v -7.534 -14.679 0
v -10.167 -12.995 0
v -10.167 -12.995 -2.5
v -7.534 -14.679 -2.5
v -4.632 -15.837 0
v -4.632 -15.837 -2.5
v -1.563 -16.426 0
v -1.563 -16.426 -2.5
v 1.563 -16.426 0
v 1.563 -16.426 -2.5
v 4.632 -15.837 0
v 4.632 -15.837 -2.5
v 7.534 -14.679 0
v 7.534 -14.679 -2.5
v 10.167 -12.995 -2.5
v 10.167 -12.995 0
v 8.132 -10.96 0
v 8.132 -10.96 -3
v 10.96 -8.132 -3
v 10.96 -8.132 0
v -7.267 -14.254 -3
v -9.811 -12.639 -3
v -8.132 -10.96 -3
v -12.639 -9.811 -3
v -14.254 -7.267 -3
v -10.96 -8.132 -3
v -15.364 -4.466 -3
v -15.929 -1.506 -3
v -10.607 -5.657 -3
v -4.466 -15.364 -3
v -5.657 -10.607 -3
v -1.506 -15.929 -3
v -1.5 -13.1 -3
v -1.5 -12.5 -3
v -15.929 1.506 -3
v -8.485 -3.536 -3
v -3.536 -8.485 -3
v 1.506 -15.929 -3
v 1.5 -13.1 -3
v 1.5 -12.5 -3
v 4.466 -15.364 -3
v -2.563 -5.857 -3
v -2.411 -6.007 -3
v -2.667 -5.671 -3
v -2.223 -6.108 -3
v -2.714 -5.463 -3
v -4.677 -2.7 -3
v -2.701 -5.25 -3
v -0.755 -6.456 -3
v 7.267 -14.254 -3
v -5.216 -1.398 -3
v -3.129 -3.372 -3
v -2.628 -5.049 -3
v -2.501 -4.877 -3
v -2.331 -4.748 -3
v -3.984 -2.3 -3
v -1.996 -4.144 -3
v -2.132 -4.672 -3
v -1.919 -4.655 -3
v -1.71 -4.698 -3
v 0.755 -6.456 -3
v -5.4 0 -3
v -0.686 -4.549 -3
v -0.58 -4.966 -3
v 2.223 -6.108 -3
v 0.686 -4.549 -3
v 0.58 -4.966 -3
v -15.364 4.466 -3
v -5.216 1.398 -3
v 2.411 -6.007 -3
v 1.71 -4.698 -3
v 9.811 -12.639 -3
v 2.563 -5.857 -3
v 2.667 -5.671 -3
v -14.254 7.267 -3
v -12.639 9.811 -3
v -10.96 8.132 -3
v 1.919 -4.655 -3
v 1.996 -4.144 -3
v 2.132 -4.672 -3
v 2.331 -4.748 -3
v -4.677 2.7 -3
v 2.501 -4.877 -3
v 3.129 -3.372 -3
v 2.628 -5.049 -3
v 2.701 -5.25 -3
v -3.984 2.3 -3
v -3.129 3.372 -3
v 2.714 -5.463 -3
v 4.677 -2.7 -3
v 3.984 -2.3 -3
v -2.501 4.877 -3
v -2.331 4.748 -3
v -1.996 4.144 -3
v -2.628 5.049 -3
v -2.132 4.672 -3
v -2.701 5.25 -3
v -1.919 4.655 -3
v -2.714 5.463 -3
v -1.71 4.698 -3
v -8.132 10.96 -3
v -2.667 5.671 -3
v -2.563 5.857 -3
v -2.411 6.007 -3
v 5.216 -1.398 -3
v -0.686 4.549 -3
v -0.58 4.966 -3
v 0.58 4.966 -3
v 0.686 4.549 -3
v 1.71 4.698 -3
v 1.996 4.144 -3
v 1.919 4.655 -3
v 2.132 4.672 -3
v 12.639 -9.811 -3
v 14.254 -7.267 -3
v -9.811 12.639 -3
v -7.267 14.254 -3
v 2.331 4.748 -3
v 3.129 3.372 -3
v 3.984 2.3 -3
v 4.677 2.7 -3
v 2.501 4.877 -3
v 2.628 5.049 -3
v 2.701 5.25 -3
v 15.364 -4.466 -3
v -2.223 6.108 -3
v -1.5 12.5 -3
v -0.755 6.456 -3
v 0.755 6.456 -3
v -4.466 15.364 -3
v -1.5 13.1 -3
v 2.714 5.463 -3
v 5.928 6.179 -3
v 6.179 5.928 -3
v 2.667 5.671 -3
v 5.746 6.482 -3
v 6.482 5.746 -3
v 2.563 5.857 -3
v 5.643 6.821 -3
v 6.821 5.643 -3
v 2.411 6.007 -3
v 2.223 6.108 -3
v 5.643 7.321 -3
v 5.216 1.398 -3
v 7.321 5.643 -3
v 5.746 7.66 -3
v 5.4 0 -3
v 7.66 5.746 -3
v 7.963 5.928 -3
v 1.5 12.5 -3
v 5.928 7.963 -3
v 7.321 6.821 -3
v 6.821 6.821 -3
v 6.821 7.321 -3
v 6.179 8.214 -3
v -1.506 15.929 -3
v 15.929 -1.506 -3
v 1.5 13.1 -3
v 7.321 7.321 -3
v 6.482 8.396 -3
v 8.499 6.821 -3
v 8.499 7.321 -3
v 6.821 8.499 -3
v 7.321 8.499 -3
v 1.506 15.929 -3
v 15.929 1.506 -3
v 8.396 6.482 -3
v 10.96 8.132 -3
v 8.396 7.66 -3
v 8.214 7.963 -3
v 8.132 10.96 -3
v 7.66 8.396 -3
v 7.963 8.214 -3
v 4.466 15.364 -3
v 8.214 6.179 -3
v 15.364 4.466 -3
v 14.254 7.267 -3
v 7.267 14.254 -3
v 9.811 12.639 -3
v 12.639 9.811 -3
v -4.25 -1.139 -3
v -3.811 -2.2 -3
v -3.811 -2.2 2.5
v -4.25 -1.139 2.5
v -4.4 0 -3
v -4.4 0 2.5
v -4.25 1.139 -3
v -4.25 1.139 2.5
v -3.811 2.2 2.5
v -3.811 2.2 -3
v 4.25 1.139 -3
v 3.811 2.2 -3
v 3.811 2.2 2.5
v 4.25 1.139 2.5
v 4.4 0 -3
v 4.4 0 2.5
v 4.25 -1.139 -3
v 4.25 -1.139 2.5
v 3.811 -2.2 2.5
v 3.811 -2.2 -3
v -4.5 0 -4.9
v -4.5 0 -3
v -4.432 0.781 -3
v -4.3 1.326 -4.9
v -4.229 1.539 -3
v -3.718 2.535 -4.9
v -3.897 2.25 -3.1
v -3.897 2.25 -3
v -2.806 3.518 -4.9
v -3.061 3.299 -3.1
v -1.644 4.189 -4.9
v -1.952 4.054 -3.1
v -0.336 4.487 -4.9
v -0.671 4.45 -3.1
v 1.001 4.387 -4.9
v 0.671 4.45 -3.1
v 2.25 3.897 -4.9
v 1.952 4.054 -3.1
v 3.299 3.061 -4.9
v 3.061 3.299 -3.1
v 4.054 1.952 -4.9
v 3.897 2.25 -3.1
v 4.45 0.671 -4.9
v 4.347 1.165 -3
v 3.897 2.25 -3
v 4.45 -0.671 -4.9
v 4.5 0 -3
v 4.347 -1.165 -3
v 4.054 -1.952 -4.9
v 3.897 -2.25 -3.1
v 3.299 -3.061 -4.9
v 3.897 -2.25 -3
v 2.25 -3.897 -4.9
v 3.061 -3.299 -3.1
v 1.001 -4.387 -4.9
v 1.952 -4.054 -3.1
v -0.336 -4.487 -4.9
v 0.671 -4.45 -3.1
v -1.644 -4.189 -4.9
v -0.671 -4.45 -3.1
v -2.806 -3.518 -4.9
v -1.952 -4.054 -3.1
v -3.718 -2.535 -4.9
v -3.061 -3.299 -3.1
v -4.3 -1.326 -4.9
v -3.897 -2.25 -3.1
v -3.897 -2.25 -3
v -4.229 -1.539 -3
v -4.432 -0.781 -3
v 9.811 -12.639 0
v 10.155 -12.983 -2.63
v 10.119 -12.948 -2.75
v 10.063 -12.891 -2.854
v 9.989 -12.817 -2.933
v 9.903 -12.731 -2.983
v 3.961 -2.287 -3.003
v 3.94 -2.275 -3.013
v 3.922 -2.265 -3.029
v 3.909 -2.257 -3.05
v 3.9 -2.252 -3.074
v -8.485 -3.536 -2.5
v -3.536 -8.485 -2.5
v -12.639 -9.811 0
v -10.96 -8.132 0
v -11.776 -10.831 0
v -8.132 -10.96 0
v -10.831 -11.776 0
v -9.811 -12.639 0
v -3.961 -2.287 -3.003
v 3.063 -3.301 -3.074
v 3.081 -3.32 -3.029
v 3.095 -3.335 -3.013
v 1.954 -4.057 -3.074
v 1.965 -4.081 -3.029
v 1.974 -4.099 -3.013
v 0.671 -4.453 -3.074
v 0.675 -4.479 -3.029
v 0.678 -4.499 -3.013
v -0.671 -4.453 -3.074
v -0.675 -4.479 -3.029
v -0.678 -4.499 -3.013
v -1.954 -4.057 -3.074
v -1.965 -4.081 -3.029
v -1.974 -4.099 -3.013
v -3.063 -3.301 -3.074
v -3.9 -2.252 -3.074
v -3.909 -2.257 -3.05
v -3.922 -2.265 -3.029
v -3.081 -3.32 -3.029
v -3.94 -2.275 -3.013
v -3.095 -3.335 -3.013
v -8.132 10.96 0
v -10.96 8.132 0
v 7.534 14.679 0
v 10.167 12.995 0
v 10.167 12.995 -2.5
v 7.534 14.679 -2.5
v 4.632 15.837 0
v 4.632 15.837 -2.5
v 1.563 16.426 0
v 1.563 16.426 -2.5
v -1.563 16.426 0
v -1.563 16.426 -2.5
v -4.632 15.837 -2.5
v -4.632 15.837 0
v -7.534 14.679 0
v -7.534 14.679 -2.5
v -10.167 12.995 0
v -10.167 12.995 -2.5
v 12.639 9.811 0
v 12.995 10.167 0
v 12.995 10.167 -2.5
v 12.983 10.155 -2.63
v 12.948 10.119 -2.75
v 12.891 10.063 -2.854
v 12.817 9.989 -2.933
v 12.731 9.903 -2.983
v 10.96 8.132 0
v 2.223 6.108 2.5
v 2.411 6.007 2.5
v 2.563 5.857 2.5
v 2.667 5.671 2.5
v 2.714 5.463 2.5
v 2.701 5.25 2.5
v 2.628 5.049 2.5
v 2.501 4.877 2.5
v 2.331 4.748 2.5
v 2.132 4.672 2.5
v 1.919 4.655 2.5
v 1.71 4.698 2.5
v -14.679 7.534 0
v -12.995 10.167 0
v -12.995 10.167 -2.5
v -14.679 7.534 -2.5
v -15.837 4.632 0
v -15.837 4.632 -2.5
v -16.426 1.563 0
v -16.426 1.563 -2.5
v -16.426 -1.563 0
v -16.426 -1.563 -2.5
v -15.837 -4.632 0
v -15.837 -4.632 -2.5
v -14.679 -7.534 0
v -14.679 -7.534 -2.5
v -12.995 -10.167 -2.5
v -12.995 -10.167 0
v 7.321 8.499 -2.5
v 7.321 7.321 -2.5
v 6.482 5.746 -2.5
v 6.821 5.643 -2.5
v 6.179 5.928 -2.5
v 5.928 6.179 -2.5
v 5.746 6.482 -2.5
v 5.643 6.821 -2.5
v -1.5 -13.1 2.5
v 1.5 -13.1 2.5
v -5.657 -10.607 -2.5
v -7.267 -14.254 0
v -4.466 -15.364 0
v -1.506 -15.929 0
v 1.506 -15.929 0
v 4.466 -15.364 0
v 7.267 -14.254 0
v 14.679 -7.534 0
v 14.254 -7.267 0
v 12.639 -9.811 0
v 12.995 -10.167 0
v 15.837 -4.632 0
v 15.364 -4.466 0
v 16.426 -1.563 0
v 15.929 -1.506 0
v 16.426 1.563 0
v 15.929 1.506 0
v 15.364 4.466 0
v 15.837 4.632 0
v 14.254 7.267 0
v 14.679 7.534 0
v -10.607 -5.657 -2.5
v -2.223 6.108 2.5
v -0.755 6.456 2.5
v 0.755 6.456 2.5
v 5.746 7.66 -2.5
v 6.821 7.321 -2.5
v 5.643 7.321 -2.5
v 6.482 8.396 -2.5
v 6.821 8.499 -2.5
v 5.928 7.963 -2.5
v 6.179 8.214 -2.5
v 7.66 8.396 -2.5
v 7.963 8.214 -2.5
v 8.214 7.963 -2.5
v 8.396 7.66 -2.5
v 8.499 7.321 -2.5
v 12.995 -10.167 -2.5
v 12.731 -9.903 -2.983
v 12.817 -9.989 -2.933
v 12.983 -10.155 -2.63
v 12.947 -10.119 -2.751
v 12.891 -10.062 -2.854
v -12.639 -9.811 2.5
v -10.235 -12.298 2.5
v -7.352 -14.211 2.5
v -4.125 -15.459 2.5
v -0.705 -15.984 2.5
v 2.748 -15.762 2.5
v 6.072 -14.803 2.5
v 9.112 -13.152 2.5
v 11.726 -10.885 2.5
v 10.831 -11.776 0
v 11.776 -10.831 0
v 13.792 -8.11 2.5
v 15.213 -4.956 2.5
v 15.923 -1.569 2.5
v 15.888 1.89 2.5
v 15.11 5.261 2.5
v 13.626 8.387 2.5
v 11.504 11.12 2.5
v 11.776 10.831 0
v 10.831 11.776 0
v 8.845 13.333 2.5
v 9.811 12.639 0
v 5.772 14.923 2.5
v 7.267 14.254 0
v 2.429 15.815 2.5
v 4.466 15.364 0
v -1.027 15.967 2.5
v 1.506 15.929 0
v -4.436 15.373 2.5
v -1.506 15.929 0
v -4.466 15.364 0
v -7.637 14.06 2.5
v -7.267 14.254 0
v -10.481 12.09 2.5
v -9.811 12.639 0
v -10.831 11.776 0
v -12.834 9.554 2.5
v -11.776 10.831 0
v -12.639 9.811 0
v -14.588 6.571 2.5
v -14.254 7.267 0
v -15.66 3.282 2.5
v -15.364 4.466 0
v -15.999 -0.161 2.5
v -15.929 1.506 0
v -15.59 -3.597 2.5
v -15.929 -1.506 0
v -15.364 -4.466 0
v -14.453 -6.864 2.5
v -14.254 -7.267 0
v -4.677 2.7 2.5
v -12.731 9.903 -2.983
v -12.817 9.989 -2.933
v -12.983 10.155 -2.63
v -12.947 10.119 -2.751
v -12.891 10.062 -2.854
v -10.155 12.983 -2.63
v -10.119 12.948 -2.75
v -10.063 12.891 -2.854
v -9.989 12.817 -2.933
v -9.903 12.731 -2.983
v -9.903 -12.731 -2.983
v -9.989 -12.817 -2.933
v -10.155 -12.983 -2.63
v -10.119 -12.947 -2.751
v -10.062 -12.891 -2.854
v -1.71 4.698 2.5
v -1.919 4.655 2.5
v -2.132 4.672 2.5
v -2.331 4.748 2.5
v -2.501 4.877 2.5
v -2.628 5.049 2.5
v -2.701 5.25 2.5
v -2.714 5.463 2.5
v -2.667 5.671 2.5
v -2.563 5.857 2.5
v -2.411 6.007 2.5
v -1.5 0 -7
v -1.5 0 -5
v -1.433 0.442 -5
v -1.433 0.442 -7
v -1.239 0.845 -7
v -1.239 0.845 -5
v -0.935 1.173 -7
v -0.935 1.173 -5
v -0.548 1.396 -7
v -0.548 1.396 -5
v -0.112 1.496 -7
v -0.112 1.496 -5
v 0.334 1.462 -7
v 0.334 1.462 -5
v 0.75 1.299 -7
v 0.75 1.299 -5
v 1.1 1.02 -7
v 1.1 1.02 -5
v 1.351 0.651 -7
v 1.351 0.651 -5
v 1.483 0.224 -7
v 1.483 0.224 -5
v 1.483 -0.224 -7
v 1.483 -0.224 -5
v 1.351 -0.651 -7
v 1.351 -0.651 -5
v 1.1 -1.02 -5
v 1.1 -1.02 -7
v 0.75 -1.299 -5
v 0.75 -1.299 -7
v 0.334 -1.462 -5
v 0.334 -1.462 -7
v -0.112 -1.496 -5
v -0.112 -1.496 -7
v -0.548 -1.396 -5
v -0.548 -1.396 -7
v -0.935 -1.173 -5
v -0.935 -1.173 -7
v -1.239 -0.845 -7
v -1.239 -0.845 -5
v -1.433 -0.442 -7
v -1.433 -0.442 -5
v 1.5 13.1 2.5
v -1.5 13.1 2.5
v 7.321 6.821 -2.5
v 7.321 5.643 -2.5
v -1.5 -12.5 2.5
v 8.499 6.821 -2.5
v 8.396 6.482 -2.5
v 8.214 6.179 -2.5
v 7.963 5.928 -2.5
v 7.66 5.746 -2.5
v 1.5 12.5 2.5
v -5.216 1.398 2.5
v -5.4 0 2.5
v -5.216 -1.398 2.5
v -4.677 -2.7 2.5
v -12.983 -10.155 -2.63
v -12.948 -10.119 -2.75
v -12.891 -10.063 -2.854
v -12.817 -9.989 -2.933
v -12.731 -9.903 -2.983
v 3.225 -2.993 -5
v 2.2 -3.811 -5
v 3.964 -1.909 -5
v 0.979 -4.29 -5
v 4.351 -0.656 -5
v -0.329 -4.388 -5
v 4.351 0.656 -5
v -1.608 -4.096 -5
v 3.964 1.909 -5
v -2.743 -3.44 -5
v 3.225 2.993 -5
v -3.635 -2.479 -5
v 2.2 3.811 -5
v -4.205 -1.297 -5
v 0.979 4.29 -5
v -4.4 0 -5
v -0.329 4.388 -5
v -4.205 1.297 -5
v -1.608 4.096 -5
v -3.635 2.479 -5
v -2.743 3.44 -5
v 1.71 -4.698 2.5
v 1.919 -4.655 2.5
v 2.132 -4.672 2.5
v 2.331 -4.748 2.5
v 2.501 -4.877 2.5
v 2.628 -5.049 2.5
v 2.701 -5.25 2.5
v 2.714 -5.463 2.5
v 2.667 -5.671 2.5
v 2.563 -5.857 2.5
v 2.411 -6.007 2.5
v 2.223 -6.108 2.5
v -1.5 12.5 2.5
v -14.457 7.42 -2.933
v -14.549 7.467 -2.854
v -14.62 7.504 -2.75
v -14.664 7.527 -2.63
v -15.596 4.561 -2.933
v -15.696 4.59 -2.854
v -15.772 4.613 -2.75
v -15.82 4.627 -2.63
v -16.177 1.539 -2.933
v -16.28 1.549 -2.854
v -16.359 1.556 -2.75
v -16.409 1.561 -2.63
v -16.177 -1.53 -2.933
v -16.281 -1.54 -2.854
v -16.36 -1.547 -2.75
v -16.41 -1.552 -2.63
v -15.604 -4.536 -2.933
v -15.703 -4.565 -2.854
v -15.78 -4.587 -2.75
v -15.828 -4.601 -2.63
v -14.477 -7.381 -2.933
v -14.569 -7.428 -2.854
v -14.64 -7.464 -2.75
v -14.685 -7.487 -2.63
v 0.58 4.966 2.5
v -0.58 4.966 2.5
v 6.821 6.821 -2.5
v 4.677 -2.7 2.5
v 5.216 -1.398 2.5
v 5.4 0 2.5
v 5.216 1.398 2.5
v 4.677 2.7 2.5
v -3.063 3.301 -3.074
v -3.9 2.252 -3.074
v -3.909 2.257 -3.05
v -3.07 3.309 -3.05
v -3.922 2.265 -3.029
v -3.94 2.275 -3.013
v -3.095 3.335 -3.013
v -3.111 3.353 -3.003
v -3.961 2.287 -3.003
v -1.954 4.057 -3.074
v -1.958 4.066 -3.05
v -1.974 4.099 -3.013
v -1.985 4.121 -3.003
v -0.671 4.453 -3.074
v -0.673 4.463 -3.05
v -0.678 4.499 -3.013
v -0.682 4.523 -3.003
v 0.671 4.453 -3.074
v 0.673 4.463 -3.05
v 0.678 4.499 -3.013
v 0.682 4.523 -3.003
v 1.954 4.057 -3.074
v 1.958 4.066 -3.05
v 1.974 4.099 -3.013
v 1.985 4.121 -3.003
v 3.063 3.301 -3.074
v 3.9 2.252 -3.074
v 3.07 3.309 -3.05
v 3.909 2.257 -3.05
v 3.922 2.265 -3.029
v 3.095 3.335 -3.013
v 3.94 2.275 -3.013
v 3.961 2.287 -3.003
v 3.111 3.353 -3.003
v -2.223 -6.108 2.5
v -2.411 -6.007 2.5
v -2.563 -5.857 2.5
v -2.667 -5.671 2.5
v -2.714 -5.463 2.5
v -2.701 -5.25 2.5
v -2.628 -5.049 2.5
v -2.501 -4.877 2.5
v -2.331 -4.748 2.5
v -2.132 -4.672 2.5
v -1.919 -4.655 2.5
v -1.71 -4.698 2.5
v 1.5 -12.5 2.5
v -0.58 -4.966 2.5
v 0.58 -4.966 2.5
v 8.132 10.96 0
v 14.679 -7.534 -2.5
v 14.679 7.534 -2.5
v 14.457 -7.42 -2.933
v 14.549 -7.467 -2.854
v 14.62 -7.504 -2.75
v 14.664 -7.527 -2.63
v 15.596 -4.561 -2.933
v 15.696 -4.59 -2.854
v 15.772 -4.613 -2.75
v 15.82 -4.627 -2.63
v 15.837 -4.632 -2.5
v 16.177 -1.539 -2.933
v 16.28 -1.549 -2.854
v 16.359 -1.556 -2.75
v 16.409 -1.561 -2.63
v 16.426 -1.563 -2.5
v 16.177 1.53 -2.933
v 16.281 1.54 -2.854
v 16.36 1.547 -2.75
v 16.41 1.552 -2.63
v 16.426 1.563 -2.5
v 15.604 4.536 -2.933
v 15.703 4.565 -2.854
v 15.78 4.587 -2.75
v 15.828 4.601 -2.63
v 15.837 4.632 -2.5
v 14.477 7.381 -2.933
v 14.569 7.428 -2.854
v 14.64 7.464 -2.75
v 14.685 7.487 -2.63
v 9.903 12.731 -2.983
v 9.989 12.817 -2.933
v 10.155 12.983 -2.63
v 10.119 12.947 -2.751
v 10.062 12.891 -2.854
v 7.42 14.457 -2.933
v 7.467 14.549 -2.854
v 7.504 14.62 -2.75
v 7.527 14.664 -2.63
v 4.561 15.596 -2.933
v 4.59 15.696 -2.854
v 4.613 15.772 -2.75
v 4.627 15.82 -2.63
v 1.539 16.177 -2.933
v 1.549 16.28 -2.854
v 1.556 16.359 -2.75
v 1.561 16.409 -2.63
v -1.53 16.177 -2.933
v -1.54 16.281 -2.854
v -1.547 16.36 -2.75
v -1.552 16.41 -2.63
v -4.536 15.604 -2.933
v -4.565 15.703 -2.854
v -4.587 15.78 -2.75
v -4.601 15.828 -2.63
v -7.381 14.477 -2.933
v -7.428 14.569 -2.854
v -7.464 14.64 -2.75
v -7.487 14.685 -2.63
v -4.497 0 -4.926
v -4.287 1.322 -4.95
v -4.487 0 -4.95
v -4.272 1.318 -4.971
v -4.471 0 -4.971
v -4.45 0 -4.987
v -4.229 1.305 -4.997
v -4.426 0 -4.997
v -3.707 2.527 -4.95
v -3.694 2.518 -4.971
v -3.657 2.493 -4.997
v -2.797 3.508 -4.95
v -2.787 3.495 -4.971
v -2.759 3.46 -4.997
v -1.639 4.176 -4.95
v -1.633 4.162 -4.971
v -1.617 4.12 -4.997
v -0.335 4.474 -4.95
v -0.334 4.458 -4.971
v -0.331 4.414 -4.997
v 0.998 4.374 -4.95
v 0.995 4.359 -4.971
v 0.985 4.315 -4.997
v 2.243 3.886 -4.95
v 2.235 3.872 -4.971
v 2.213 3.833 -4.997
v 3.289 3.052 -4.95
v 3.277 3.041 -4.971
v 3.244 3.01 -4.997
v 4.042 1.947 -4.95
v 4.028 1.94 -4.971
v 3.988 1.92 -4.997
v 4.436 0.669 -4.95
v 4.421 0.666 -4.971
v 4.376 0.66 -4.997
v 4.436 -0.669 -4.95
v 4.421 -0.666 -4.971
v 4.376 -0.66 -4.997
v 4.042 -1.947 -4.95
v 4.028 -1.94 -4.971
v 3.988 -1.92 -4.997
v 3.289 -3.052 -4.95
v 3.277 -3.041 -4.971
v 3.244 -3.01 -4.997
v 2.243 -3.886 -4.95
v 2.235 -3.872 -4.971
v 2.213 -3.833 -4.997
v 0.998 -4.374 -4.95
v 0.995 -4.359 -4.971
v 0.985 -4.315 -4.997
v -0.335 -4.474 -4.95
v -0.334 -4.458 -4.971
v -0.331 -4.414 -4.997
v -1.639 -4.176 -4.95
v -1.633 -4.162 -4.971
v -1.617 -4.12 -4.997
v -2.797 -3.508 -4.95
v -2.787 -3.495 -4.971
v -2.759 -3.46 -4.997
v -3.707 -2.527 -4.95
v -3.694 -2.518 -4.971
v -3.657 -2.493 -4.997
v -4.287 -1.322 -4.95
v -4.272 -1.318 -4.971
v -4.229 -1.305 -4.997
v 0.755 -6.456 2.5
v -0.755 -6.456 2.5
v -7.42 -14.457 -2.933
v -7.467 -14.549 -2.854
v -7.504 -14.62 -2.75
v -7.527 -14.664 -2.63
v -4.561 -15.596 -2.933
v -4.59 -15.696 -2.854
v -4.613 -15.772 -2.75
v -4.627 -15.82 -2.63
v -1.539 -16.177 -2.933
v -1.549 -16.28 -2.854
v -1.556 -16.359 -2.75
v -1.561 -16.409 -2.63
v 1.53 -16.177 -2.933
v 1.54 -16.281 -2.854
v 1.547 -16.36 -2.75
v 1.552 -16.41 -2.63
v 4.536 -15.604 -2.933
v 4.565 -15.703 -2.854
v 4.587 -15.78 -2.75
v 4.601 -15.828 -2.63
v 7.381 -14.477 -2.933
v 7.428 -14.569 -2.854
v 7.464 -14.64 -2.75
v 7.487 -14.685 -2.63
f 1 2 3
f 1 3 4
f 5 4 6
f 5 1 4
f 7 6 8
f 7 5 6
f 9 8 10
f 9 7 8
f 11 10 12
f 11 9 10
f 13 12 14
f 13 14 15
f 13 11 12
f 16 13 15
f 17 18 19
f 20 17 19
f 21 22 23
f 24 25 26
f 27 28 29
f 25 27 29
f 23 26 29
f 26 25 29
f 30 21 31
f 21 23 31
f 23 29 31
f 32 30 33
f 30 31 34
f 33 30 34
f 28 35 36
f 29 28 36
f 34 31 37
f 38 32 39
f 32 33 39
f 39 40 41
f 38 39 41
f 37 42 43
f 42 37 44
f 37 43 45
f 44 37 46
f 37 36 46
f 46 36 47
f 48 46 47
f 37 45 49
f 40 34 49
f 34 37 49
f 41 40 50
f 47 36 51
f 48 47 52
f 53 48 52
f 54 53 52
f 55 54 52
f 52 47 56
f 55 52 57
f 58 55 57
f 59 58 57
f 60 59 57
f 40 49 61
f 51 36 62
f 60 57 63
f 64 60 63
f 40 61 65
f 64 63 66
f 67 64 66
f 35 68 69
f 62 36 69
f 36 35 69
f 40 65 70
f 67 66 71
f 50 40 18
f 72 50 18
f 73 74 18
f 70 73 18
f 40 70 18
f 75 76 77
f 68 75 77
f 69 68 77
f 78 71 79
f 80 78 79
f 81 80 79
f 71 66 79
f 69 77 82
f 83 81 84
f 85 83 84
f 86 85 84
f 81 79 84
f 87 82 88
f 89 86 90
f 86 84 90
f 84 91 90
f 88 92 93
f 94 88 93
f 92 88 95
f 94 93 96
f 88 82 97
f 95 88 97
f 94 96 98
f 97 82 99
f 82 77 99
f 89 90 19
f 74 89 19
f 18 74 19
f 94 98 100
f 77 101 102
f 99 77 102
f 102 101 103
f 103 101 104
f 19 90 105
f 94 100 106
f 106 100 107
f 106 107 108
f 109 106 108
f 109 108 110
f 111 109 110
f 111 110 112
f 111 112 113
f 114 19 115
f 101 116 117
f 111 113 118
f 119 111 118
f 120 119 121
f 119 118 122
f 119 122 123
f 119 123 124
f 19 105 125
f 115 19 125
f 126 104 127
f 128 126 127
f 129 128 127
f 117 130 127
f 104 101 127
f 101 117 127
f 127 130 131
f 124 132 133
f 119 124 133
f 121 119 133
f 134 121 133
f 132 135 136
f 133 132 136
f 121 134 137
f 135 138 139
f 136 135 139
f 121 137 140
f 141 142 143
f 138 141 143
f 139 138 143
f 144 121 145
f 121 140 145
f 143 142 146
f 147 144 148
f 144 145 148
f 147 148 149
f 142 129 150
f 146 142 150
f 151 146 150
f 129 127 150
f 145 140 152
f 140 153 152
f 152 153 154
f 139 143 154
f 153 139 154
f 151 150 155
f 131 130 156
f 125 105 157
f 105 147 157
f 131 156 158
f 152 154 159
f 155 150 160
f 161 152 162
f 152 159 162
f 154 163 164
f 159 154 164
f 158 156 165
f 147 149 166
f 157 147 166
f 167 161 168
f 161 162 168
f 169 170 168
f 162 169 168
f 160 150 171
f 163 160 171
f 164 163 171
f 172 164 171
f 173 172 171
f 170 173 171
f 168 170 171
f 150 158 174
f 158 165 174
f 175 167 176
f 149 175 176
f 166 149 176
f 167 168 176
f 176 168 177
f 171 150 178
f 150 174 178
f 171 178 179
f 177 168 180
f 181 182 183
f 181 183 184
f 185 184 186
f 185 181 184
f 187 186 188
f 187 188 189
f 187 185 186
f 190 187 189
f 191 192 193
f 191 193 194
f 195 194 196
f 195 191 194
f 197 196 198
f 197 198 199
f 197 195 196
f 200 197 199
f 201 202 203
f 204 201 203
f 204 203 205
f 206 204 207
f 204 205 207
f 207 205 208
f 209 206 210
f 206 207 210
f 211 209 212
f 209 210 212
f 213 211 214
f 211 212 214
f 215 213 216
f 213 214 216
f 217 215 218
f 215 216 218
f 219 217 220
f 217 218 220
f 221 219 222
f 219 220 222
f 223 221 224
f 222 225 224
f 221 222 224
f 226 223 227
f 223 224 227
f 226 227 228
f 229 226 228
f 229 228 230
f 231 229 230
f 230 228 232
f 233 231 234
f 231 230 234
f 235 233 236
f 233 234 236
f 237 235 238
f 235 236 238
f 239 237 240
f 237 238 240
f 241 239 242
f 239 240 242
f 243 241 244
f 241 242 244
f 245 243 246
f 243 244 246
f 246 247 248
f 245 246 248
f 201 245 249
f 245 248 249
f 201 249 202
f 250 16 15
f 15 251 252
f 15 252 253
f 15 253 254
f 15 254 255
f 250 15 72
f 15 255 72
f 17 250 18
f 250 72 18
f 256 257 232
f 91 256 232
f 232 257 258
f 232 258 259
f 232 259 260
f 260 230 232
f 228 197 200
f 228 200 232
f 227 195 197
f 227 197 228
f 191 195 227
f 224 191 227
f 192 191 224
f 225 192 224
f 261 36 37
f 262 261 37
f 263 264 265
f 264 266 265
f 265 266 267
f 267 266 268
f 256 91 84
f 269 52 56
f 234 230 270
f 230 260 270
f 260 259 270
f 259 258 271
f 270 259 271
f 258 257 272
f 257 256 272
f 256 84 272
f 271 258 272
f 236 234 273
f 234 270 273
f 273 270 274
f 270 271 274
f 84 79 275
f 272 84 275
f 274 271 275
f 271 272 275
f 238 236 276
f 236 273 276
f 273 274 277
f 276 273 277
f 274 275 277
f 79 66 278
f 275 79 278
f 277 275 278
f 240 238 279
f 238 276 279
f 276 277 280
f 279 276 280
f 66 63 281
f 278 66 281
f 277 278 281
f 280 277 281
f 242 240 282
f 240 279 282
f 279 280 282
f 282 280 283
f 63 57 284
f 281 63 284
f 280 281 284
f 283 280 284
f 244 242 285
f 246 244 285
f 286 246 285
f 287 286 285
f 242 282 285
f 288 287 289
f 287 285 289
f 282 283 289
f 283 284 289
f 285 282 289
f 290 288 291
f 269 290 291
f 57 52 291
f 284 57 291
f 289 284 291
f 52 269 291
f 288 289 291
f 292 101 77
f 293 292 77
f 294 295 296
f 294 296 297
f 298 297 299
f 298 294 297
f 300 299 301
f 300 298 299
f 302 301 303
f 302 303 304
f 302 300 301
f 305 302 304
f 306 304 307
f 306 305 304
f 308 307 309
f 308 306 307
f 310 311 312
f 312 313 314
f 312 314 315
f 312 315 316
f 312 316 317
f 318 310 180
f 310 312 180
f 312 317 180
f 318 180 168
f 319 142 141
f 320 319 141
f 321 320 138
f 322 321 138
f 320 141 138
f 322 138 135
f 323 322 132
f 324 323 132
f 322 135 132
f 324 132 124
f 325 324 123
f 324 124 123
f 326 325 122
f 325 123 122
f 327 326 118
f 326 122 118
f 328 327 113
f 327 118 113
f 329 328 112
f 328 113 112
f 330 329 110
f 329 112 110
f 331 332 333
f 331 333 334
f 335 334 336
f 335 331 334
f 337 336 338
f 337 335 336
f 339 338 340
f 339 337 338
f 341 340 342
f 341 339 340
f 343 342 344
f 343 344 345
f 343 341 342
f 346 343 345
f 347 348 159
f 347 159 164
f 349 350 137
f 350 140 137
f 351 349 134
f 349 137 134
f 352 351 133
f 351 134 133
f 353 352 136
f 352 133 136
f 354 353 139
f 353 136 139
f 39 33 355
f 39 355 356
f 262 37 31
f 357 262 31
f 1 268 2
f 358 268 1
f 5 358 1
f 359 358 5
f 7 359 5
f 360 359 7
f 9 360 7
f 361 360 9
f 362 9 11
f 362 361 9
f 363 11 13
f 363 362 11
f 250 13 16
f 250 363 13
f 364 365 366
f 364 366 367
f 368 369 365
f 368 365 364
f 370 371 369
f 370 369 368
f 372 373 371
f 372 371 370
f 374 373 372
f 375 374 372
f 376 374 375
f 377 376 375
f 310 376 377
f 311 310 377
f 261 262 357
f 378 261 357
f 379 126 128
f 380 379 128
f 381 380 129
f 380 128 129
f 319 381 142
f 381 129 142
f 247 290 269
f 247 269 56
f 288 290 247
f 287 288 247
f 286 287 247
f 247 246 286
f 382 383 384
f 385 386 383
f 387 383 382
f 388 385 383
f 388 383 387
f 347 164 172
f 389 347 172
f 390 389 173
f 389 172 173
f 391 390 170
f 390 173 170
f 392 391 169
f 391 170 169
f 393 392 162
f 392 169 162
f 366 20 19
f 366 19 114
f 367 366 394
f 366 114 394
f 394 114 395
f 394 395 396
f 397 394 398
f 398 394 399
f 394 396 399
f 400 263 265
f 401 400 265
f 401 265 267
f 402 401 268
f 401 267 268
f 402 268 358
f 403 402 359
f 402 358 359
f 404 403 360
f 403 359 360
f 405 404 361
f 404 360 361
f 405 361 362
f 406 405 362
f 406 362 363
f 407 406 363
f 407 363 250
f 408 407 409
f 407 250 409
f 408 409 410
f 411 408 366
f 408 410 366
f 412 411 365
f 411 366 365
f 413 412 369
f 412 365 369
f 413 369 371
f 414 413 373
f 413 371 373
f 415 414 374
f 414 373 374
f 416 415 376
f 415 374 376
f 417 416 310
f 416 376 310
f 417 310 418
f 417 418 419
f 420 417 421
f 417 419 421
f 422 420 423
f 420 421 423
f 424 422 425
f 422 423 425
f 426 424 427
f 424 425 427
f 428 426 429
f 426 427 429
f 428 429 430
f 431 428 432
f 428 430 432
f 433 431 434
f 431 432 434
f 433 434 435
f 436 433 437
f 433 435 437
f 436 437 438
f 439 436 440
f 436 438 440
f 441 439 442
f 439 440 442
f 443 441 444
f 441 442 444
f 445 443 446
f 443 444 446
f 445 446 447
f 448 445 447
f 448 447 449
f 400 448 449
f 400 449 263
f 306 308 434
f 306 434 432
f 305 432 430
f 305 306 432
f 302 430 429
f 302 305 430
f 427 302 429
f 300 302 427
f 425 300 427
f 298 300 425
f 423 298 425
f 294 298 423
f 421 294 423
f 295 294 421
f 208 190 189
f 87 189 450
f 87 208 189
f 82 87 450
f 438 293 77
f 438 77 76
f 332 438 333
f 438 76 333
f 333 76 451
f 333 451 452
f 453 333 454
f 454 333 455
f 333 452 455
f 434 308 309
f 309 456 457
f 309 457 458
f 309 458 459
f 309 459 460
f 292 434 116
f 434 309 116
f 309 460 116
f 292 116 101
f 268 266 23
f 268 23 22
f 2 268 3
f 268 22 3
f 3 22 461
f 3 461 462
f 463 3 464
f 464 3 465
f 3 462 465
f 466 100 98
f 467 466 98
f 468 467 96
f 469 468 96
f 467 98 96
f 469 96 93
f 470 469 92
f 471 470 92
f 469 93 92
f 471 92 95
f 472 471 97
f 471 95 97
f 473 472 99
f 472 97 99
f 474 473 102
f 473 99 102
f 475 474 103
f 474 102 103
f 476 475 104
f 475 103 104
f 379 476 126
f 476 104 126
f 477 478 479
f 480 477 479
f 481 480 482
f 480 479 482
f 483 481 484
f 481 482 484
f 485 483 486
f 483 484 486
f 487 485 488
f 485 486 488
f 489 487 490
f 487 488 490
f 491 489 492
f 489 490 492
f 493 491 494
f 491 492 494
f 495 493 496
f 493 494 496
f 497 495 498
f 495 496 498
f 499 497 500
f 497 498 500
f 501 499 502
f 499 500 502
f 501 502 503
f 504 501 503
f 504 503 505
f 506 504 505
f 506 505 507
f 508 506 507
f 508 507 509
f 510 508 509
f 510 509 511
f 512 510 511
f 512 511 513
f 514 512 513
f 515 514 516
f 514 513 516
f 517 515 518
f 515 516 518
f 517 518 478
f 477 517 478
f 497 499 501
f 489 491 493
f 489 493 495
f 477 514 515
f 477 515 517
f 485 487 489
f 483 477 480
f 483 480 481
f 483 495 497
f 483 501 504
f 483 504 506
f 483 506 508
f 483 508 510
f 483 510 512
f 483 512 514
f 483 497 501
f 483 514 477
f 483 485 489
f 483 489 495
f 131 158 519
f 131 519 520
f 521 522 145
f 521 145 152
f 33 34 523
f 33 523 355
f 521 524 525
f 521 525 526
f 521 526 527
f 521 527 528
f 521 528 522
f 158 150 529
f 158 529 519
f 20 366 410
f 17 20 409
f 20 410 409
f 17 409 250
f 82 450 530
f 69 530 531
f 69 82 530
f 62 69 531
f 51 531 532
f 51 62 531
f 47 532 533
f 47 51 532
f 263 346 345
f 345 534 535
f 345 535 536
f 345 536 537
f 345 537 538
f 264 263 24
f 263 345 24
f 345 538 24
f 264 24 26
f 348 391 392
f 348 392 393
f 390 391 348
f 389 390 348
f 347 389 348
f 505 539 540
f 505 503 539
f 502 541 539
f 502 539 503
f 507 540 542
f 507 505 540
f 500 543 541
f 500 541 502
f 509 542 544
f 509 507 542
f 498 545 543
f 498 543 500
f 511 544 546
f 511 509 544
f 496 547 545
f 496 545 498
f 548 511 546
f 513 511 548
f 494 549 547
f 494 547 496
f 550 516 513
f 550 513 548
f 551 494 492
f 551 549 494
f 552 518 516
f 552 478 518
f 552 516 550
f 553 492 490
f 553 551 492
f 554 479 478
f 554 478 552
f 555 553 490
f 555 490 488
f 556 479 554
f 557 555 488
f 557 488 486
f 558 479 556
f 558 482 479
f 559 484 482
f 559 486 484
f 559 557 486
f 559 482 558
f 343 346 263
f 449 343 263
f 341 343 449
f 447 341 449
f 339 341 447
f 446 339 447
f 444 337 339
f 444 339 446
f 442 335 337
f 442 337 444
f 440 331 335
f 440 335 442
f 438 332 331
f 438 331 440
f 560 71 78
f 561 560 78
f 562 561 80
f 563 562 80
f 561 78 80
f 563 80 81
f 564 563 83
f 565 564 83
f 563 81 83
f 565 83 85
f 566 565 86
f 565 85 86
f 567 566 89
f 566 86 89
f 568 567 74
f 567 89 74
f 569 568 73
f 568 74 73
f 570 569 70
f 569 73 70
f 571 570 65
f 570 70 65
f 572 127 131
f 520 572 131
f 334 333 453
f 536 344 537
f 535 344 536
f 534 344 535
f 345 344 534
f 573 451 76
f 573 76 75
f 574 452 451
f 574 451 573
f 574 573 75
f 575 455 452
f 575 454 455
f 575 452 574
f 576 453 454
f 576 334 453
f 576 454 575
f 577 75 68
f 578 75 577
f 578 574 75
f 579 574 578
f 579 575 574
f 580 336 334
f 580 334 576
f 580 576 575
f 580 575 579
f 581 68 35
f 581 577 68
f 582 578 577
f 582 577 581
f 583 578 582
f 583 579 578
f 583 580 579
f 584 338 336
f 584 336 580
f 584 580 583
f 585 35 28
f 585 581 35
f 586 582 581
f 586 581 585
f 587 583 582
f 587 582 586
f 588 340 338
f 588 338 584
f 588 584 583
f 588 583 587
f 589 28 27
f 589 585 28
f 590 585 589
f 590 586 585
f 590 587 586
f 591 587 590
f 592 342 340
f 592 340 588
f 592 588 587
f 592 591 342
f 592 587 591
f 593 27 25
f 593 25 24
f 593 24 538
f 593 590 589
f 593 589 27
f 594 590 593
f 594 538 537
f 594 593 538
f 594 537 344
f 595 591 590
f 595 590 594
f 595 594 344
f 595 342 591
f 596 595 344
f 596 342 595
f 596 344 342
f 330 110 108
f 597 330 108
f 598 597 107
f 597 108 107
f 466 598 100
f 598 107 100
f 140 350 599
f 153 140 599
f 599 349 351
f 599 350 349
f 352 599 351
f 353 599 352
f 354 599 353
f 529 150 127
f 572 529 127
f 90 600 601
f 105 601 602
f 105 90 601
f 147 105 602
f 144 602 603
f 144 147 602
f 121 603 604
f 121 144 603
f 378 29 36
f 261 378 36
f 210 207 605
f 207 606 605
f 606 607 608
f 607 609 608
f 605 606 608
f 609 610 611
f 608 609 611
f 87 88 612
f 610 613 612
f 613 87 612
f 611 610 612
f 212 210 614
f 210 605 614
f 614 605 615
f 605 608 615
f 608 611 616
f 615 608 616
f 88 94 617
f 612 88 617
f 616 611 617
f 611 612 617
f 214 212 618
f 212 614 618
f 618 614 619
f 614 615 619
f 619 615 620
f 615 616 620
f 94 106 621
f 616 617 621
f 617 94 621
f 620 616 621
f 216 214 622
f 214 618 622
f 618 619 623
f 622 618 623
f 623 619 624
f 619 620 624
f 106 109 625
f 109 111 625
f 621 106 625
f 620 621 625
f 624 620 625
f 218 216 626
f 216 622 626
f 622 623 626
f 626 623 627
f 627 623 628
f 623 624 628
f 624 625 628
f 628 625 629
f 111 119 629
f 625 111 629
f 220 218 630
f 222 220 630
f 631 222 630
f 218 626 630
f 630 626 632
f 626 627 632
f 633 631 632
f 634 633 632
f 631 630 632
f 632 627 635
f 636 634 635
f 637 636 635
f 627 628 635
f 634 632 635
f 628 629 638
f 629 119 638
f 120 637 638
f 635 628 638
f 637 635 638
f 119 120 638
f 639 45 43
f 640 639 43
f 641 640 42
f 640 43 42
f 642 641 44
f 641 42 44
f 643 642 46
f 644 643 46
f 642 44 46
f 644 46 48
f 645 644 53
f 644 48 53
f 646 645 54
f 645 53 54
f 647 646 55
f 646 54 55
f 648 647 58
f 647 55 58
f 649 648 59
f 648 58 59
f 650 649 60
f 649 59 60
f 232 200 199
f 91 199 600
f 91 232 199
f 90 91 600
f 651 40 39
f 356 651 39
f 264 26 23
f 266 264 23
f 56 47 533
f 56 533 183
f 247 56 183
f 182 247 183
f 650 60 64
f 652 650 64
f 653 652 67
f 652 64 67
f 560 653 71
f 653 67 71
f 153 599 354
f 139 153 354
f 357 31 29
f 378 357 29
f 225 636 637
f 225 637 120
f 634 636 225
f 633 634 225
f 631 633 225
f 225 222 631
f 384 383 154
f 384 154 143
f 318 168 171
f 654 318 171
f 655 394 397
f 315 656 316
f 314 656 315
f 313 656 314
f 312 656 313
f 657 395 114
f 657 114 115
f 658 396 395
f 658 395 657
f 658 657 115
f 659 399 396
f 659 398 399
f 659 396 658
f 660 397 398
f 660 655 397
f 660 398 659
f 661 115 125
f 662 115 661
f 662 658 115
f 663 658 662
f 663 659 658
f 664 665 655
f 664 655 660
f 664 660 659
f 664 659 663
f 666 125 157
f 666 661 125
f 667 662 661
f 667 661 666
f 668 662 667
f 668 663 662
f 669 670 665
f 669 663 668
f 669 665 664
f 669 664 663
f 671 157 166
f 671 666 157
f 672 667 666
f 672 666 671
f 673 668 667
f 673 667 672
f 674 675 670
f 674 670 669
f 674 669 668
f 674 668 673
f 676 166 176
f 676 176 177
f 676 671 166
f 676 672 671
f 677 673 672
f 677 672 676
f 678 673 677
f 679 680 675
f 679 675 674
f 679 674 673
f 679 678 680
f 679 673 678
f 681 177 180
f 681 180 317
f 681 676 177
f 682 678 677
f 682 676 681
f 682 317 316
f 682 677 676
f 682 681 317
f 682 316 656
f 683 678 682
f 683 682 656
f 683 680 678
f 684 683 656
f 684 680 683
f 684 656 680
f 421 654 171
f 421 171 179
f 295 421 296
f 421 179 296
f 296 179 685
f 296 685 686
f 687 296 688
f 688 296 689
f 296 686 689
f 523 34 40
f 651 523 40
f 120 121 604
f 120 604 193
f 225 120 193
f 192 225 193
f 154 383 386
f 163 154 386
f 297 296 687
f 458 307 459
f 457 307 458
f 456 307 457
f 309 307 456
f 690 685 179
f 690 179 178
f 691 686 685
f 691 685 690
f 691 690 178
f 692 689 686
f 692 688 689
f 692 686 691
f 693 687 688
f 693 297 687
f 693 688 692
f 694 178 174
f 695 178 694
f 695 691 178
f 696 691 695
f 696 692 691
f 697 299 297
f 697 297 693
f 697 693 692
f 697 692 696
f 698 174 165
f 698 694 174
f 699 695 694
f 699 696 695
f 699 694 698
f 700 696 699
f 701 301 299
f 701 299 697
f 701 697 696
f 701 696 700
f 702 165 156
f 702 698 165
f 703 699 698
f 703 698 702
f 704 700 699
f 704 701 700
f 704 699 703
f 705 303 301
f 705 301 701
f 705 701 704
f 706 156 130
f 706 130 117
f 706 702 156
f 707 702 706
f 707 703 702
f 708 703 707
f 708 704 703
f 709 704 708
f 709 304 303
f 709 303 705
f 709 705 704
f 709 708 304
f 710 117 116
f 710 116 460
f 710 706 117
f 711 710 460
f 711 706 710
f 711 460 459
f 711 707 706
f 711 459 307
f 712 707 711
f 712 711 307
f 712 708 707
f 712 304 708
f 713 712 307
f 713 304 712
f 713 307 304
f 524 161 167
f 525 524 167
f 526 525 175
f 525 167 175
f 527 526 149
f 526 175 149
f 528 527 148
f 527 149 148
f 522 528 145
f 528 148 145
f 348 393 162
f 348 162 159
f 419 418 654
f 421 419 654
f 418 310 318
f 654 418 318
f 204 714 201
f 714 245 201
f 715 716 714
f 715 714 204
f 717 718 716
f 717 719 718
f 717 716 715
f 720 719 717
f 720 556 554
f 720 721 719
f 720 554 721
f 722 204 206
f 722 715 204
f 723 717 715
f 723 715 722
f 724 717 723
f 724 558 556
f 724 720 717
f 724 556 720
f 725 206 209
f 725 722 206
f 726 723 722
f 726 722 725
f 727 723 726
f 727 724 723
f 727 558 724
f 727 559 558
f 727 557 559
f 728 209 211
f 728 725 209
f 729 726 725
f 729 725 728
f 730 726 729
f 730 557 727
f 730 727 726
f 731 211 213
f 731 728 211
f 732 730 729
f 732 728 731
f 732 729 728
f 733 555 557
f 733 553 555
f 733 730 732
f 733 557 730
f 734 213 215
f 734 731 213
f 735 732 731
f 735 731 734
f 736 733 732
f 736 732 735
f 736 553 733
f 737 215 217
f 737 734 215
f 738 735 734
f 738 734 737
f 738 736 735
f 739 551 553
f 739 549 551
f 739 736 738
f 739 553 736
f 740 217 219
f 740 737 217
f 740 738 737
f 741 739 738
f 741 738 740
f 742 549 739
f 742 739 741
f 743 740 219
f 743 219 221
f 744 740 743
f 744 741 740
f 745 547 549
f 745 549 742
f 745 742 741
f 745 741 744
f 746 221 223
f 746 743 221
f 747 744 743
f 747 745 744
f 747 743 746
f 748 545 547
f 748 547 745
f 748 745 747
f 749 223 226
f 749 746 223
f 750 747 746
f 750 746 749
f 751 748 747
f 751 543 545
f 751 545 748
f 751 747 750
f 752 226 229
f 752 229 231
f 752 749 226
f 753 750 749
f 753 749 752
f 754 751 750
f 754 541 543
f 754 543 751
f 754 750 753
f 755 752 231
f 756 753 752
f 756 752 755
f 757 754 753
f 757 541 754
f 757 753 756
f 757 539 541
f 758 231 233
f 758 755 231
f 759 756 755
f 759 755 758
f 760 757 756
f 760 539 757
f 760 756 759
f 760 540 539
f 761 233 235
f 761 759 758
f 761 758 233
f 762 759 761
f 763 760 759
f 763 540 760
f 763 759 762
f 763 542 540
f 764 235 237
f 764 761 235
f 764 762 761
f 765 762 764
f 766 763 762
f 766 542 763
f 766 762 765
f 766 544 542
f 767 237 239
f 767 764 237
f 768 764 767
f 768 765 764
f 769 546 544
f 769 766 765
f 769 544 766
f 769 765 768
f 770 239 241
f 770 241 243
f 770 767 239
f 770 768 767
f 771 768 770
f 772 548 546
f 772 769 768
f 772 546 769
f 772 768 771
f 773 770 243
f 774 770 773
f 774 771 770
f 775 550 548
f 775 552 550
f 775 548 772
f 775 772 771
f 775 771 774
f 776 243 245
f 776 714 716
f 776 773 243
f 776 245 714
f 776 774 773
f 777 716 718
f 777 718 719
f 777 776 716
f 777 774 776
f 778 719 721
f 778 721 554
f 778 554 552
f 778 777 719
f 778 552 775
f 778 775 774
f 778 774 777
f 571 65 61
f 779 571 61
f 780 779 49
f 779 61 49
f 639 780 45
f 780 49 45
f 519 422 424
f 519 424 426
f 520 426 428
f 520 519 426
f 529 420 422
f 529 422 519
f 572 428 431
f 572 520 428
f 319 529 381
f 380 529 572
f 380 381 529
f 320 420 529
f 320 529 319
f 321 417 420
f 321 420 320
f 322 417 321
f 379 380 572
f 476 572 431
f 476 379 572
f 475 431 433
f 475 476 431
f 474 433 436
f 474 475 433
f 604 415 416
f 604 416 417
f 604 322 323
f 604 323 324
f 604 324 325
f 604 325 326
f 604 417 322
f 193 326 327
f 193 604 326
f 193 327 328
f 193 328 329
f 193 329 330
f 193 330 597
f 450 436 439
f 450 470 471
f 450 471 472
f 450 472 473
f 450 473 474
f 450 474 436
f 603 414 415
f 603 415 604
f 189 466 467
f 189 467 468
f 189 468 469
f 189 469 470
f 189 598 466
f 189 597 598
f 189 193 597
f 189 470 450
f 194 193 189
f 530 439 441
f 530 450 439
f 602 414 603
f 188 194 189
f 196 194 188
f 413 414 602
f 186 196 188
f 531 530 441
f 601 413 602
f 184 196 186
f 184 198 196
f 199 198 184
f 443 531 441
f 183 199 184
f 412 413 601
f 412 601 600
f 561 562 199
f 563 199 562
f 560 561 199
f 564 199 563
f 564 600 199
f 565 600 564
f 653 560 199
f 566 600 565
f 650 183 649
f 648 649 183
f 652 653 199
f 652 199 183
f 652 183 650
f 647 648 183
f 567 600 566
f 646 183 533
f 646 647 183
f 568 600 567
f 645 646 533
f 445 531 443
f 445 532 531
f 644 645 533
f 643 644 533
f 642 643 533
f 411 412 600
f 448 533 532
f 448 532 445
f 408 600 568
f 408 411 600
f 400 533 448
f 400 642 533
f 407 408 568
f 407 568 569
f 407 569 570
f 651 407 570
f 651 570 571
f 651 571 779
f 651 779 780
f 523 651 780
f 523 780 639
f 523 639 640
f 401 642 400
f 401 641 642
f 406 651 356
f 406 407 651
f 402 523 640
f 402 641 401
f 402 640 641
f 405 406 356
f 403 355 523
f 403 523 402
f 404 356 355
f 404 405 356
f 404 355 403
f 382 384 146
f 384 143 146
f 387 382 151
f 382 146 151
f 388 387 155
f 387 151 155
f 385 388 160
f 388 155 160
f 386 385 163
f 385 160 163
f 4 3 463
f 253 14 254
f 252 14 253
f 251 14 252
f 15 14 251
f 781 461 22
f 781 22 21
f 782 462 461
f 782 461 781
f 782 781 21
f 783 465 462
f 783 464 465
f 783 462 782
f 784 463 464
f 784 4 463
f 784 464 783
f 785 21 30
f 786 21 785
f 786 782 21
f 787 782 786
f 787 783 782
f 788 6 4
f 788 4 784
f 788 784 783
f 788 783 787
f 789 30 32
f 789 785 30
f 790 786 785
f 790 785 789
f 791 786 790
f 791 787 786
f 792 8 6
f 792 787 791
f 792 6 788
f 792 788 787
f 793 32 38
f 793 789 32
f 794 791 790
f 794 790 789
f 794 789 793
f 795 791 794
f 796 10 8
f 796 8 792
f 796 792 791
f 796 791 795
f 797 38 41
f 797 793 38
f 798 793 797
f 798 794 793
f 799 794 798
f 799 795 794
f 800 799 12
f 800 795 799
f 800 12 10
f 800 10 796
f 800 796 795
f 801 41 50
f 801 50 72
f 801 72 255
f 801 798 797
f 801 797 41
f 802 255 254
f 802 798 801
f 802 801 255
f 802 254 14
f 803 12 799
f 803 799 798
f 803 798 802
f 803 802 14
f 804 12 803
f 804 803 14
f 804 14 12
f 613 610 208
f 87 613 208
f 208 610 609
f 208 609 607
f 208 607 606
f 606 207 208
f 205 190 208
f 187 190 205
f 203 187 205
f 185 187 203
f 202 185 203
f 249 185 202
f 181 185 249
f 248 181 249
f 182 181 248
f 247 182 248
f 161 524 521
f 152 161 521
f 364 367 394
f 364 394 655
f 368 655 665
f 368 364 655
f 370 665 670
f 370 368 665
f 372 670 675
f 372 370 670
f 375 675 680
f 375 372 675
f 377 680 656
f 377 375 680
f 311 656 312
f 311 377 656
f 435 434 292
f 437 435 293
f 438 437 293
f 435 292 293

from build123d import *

# Parameters (mm, degrees)
SKETCH1_R           = 16.5
BOSS_EXTRUDE1_DEPTH = 3
SKETCH2_R           = 4.5
BOSS_EXTRUDE2_DEPTH = 2
CUT_EXTRUDE1_DEPTH  = 24.526580712
CIRPATTERN1_COUNT   = 4
SKETCH4_R           = 16
BOSS_EXTRUDE3_DEPTH = 2.5
CUT_EXTRUDE2_DEPTH  = 24.973944189
CIRPATTERN2_COUNT   = 2
CUT_EXTRUDE3_DEPTH  = 24.973944189
CIRPATTERN3_COUNT   = 2
SKETCH8_R           = 1.45
CUT_EXTRUDE4_DEPTH  = 0.5
SKETCH9_W           = 0.5
SKETCH9_H           = 2.9
EXTRUDE_THIN1_DEPTH = 0.5
SKETCH10_W          = 2.9
SKETCH10_H          = 0.5
EXTRUDE_THIN2_DEPTH = 0.5
SKETCH11_W          = 3
SKETCH11_H          = 0.6
CUT_EXTRUDE5_DEPTH  = 24.973944189
CIRPATTERN4_COUNT   = 2
FILLET1_R           = 0.1
FILLET2_R           = 0.5
SKETCH_1_R          = 1.5
EXTRUDE_1_DEPTH     = 2


with BuildPart() as part:
    # Sketch1 → Boss-Extrude1 (new body)
    with BuildSketch(Plane.XY):
        Circle(SKETCH1_R)
    extrude(amount=-BOSS_EXTRUDE1_DEPTH)

    # Sketch2 → Boss-Extrude2 (add)
    with BuildSketch(Plane(origin=(0, 0, -3), x_dir=(-1, 0, 0), z_dir=(0, 0, -1))):
        Circle(SKETCH2_R)
    extrude(amount=BOSS_EXTRUDE2_DEPTH)

    # Sketch3 → Cut-Extrude1 (cut, through all)
    with BuildSketch(Plane(origin=(0, 0, -3), x_dir=(-1, 0, 0), z_dir=(0, 0, -1))):
        Polygon((10.253048327, 13.081475452), (8.131727984, 10.960155108), (10.960155108, 8.131727984), (13.081475452, 10.253048327), align=None)
    cut_extrude1 = extrude(amount=-CUT_EXTRUDE1_DEPTH, mode=Mode.SUBTRACT)

    # CirPattern1: Cut-Extrude1 ×4 about axis
    cirpattern1_axis = Axis((0, 0, 0), (0, 0, 1))
    for i in range(1, CIRPATTERN1_COUNT):
        add(cut_extrude1.rotate(cirpattern1_axis, i * 360 / CIRPATTERN1_COUNT), mode=Mode.SUBTRACT)

    # Sketch4 → Boss-Extrude3 (add)
    with BuildSketch(Plane.XY):
        with Locations(Location((0, 0, 0), (0, 0, 217.819244219))):
            Circle(SKETCH4_R)
    extrude(amount=BOSS_EXTRUDE3_DEPTH)

    # Sketch6 → Cut-Extrude2 (cut, through all)
    with BuildSketch(Plane(origin=(0, 0, -3), x_dir=(-1, 0, 0), z_dir=(0, 0, -1))):
        with BuildLine():
            Line((-4.67653718, 2.7), (-3.810511777, 2.2))
            ThreePointArc((-3.810511777, 2.2), (-4.4, 0), (-3.810511777, -2.2))
            Line((-3.810511777, -2.2), (-4.67653718, -2.7))
            ThreePointArc((-4.67653718, -2.7), (-5.4, 0), (-4.67653718, 2.7))
        make_face()
    cut_extrude2 = extrude(amount=-CUT_EXTRUDE2_DEPTH, mode=Mode.SUBTRACT)

    # CirPattern2: Cut-Extrude2 ×2 about axis
    cirpattern2_axis = Axis((0, 0, 0), (0, 0, 1))
    for i in range(1, CIRPATTERN2_COUNT):
        add(cut_extrude2.rotate(cirpattern2_axis, i * 360 / CIRPATTERN2_COUNT), mode=Mode.SUBTRACT)

    # Sketch7 → Cut-Extrude3 (cut, through all)
    with BuildSketch(Plane(origin=(0, 0, -3), x_dir=(-1, 0, 0), z_dir=(0, 0, -1))):
        with BuildLine():
            ThreePointArc((2.223130932, 6.108002035), (0, 6.5), (-2.223130932, 6.108002035))
            ThreePointArc((-2.223130932, 6.108002035), (-2.67138529, 5.146717462), (-1.710100717, 4.698463104))
            ThreePointArc((-1.710100717, 4.698463104), (0, 5), (1.710100717, 4.698463104))
            ThreePointArc((1.710100717, 4.698463104), (2.67138529, 5.146717462), (2.223130932, 6.108002035))
        make_face()
    cut_extrude3 = extrude(amount=-CUT_EXTRUDE3_DEPTH, mode=Mode.SUBTRACT)

    # CirPattern3: Cut-Extrude3 ×2 about axis
    cirpattern3_axis = Axis((0, 0, 0), (0, 0, 1))
    for i in range(1, CIRPATTERN3_COUNT):
        add(cut_extrude3.rotate(cirpattern3_axis, i * 360 / CIRPATTERN3_COUNT), mode=Mode.SUBTRACT)

    # Sketch8 → Cut-Extrude4 (cut)
    with BuildSketch(Plane(origin=(0, 0, -3), x_dir=(-1, 0, 0), z_dir=(0, 0, -1))):
        with Locations((-7.071067812, 7.071067812)):
            Circle(SKETCH8_R)
        Polygon((8.485281374, -3.535533906), (3.535533906, -8.485281374), (5.656854249, -10.606601718), (10.606601718, -5.656854249), align=None)
    extrude(amount=-CUT_EXTRUDE4_DEPTH, mode=Mode.SUBTRACT)

    # Sketch9 → Extrude-Thin1 (add)
    with BuildSketch(Plane(origin=(0, 0, -2.5), x_dir=(-1, 0, 0), z_dir=(0, 0, -1))):
        with Locations((-7.071067812, 7.071067812)):
            Rectangle(SKETCH9_W, SKETCH9_H)
    extrude(amount=EXTRUDE_THIN1_DEPTH)

    # Sketch10 → Extrude-Thin2 (add)
    with BuildSketch(Plane(origin=(0, 0, -2.5), x_dir=(-1, 0, 0), z_dir=(0, 0, -1))):
        with Locations((-7.071067812, 7.071067812)):
            Rectangle(SKETCH10_W, SKETCH10_H)
    extrude(amount=EXTRUDE_THIN2_DEPTH)

    # Sketch11 → Cut-Extrude5 (cut, through all)
    with BuildSketch(Plane(origin=(0, 0, -3), x_dir=(-1, 0, 0), z_dir=(0, 0, -1))):
        with Locations((0, 12.8)):
            Rectangle(SKETCH11_W, SKETCH11_H)
    cut_extrude5 = extrude(amount=-CUT_EXTRUDE5_DEPTH, mode=Mode.SUBTRACT)

    # CirPattern4: Cut-Extrude5 ×2 about axis
    cirpattern4_axis = Axis((0, 0, 0), (0, 0, 1))
    for i in range(1, CIRPATTERN4_COUNT):
        add(cut_extrude5.rotate(cirpattern4_axis, i * 360 / CIRPATTERN4_COUNT), mode=Mode.SUBTRACT)

    # Fillet1
    # the kernel refuses this fillet: 0.1 mm, written as the material it adds along each edge
    with BuildSketch(Plane(origin=(0, 0, -3), x_dir=(0.86602540378442, -0.5000000000000324, 0), z_dir=(0.5000000000000324, 0.86602540378442, 0))) as fillet1_piece_1:
        with BuildLine():
            CenterArc((4.5 + FILLET1_R, FILLET1_R), FILLET1_R, 180, 90)
            Line((4.5, FILLET1_R), (4.5, 0))
            Line((4.5, 0), (4.5 + FILLET1_R, 0))
        make_face()
    revolve(axis=Axis((0, 0, -3), (0, 0, -1)), revolution_arc=120)
    with BuildSketch(Plane(origin=(0, 0, -3), x_dir=(-0.8660254037844196, 0.500000000000033, 0), z_dir=(-0.500000000000033, -0.8660254037844196, 0))) as fillet1_piece_2:
        with BuildLine():
            CenterArc((4.5 + FILLET1_R, FILLET1_R), FILLET1_R, 180, 90)
            Line((4.5, FILLET1_R), (4.5, 0))
            Line((4.5, 0), (4.5 + FILLET1_R, 0))
        make_face()
    revolve(axis=Axis((0, 0, -3), (0, 0, -1)), revolution_arc=120)
    # the kernel refuses this fillet: 0.1 mm, written as the material it takes off along each edge
    with BuildSketch(Plane(origin=(0, 0, -5), x_dir=(-1, 0, 0), z_dir=(0, -1, 0))) as fillet1_2_piece_1:
        with BuildLine():
            CenterArc((4.5 - FILLET1_R, -FILLET1_R), FILLET1_R, 0, 90)
            Line((4.5 - FILLET1_R, 0), (4.5, 0))
            Line((4.5, 0), (4.5, -FILLET1_R))
        make_face()
    revolve(axis=Axis((0, 0, -5), (0, 0, -1)), mode=Mode.SUBTRACT)

    # Fillet2
    fillet2_edges = [part.edges().sort_by_distance(p)[0] for p in [
        (-16.5, 0, -3),
        (0, -16.5, -3),
        (16.5, 0, -3),
        (0, 16.5, -3),
    ]]
    fillet(fillet2_edges, radius=FILLET2_R)

    # Эскиз1 → Бобышка-Вытянуть1 (add)
    with BuildSketch(Plane(origin=(0, 0, -5), x_dir=(-1, 0, 0), z_dir=(0, 0, -1))):
        Circle(SKETCH_1_R)
    extrude(amount=EXTRUDE_1_DEPTH)


solid = part.part
